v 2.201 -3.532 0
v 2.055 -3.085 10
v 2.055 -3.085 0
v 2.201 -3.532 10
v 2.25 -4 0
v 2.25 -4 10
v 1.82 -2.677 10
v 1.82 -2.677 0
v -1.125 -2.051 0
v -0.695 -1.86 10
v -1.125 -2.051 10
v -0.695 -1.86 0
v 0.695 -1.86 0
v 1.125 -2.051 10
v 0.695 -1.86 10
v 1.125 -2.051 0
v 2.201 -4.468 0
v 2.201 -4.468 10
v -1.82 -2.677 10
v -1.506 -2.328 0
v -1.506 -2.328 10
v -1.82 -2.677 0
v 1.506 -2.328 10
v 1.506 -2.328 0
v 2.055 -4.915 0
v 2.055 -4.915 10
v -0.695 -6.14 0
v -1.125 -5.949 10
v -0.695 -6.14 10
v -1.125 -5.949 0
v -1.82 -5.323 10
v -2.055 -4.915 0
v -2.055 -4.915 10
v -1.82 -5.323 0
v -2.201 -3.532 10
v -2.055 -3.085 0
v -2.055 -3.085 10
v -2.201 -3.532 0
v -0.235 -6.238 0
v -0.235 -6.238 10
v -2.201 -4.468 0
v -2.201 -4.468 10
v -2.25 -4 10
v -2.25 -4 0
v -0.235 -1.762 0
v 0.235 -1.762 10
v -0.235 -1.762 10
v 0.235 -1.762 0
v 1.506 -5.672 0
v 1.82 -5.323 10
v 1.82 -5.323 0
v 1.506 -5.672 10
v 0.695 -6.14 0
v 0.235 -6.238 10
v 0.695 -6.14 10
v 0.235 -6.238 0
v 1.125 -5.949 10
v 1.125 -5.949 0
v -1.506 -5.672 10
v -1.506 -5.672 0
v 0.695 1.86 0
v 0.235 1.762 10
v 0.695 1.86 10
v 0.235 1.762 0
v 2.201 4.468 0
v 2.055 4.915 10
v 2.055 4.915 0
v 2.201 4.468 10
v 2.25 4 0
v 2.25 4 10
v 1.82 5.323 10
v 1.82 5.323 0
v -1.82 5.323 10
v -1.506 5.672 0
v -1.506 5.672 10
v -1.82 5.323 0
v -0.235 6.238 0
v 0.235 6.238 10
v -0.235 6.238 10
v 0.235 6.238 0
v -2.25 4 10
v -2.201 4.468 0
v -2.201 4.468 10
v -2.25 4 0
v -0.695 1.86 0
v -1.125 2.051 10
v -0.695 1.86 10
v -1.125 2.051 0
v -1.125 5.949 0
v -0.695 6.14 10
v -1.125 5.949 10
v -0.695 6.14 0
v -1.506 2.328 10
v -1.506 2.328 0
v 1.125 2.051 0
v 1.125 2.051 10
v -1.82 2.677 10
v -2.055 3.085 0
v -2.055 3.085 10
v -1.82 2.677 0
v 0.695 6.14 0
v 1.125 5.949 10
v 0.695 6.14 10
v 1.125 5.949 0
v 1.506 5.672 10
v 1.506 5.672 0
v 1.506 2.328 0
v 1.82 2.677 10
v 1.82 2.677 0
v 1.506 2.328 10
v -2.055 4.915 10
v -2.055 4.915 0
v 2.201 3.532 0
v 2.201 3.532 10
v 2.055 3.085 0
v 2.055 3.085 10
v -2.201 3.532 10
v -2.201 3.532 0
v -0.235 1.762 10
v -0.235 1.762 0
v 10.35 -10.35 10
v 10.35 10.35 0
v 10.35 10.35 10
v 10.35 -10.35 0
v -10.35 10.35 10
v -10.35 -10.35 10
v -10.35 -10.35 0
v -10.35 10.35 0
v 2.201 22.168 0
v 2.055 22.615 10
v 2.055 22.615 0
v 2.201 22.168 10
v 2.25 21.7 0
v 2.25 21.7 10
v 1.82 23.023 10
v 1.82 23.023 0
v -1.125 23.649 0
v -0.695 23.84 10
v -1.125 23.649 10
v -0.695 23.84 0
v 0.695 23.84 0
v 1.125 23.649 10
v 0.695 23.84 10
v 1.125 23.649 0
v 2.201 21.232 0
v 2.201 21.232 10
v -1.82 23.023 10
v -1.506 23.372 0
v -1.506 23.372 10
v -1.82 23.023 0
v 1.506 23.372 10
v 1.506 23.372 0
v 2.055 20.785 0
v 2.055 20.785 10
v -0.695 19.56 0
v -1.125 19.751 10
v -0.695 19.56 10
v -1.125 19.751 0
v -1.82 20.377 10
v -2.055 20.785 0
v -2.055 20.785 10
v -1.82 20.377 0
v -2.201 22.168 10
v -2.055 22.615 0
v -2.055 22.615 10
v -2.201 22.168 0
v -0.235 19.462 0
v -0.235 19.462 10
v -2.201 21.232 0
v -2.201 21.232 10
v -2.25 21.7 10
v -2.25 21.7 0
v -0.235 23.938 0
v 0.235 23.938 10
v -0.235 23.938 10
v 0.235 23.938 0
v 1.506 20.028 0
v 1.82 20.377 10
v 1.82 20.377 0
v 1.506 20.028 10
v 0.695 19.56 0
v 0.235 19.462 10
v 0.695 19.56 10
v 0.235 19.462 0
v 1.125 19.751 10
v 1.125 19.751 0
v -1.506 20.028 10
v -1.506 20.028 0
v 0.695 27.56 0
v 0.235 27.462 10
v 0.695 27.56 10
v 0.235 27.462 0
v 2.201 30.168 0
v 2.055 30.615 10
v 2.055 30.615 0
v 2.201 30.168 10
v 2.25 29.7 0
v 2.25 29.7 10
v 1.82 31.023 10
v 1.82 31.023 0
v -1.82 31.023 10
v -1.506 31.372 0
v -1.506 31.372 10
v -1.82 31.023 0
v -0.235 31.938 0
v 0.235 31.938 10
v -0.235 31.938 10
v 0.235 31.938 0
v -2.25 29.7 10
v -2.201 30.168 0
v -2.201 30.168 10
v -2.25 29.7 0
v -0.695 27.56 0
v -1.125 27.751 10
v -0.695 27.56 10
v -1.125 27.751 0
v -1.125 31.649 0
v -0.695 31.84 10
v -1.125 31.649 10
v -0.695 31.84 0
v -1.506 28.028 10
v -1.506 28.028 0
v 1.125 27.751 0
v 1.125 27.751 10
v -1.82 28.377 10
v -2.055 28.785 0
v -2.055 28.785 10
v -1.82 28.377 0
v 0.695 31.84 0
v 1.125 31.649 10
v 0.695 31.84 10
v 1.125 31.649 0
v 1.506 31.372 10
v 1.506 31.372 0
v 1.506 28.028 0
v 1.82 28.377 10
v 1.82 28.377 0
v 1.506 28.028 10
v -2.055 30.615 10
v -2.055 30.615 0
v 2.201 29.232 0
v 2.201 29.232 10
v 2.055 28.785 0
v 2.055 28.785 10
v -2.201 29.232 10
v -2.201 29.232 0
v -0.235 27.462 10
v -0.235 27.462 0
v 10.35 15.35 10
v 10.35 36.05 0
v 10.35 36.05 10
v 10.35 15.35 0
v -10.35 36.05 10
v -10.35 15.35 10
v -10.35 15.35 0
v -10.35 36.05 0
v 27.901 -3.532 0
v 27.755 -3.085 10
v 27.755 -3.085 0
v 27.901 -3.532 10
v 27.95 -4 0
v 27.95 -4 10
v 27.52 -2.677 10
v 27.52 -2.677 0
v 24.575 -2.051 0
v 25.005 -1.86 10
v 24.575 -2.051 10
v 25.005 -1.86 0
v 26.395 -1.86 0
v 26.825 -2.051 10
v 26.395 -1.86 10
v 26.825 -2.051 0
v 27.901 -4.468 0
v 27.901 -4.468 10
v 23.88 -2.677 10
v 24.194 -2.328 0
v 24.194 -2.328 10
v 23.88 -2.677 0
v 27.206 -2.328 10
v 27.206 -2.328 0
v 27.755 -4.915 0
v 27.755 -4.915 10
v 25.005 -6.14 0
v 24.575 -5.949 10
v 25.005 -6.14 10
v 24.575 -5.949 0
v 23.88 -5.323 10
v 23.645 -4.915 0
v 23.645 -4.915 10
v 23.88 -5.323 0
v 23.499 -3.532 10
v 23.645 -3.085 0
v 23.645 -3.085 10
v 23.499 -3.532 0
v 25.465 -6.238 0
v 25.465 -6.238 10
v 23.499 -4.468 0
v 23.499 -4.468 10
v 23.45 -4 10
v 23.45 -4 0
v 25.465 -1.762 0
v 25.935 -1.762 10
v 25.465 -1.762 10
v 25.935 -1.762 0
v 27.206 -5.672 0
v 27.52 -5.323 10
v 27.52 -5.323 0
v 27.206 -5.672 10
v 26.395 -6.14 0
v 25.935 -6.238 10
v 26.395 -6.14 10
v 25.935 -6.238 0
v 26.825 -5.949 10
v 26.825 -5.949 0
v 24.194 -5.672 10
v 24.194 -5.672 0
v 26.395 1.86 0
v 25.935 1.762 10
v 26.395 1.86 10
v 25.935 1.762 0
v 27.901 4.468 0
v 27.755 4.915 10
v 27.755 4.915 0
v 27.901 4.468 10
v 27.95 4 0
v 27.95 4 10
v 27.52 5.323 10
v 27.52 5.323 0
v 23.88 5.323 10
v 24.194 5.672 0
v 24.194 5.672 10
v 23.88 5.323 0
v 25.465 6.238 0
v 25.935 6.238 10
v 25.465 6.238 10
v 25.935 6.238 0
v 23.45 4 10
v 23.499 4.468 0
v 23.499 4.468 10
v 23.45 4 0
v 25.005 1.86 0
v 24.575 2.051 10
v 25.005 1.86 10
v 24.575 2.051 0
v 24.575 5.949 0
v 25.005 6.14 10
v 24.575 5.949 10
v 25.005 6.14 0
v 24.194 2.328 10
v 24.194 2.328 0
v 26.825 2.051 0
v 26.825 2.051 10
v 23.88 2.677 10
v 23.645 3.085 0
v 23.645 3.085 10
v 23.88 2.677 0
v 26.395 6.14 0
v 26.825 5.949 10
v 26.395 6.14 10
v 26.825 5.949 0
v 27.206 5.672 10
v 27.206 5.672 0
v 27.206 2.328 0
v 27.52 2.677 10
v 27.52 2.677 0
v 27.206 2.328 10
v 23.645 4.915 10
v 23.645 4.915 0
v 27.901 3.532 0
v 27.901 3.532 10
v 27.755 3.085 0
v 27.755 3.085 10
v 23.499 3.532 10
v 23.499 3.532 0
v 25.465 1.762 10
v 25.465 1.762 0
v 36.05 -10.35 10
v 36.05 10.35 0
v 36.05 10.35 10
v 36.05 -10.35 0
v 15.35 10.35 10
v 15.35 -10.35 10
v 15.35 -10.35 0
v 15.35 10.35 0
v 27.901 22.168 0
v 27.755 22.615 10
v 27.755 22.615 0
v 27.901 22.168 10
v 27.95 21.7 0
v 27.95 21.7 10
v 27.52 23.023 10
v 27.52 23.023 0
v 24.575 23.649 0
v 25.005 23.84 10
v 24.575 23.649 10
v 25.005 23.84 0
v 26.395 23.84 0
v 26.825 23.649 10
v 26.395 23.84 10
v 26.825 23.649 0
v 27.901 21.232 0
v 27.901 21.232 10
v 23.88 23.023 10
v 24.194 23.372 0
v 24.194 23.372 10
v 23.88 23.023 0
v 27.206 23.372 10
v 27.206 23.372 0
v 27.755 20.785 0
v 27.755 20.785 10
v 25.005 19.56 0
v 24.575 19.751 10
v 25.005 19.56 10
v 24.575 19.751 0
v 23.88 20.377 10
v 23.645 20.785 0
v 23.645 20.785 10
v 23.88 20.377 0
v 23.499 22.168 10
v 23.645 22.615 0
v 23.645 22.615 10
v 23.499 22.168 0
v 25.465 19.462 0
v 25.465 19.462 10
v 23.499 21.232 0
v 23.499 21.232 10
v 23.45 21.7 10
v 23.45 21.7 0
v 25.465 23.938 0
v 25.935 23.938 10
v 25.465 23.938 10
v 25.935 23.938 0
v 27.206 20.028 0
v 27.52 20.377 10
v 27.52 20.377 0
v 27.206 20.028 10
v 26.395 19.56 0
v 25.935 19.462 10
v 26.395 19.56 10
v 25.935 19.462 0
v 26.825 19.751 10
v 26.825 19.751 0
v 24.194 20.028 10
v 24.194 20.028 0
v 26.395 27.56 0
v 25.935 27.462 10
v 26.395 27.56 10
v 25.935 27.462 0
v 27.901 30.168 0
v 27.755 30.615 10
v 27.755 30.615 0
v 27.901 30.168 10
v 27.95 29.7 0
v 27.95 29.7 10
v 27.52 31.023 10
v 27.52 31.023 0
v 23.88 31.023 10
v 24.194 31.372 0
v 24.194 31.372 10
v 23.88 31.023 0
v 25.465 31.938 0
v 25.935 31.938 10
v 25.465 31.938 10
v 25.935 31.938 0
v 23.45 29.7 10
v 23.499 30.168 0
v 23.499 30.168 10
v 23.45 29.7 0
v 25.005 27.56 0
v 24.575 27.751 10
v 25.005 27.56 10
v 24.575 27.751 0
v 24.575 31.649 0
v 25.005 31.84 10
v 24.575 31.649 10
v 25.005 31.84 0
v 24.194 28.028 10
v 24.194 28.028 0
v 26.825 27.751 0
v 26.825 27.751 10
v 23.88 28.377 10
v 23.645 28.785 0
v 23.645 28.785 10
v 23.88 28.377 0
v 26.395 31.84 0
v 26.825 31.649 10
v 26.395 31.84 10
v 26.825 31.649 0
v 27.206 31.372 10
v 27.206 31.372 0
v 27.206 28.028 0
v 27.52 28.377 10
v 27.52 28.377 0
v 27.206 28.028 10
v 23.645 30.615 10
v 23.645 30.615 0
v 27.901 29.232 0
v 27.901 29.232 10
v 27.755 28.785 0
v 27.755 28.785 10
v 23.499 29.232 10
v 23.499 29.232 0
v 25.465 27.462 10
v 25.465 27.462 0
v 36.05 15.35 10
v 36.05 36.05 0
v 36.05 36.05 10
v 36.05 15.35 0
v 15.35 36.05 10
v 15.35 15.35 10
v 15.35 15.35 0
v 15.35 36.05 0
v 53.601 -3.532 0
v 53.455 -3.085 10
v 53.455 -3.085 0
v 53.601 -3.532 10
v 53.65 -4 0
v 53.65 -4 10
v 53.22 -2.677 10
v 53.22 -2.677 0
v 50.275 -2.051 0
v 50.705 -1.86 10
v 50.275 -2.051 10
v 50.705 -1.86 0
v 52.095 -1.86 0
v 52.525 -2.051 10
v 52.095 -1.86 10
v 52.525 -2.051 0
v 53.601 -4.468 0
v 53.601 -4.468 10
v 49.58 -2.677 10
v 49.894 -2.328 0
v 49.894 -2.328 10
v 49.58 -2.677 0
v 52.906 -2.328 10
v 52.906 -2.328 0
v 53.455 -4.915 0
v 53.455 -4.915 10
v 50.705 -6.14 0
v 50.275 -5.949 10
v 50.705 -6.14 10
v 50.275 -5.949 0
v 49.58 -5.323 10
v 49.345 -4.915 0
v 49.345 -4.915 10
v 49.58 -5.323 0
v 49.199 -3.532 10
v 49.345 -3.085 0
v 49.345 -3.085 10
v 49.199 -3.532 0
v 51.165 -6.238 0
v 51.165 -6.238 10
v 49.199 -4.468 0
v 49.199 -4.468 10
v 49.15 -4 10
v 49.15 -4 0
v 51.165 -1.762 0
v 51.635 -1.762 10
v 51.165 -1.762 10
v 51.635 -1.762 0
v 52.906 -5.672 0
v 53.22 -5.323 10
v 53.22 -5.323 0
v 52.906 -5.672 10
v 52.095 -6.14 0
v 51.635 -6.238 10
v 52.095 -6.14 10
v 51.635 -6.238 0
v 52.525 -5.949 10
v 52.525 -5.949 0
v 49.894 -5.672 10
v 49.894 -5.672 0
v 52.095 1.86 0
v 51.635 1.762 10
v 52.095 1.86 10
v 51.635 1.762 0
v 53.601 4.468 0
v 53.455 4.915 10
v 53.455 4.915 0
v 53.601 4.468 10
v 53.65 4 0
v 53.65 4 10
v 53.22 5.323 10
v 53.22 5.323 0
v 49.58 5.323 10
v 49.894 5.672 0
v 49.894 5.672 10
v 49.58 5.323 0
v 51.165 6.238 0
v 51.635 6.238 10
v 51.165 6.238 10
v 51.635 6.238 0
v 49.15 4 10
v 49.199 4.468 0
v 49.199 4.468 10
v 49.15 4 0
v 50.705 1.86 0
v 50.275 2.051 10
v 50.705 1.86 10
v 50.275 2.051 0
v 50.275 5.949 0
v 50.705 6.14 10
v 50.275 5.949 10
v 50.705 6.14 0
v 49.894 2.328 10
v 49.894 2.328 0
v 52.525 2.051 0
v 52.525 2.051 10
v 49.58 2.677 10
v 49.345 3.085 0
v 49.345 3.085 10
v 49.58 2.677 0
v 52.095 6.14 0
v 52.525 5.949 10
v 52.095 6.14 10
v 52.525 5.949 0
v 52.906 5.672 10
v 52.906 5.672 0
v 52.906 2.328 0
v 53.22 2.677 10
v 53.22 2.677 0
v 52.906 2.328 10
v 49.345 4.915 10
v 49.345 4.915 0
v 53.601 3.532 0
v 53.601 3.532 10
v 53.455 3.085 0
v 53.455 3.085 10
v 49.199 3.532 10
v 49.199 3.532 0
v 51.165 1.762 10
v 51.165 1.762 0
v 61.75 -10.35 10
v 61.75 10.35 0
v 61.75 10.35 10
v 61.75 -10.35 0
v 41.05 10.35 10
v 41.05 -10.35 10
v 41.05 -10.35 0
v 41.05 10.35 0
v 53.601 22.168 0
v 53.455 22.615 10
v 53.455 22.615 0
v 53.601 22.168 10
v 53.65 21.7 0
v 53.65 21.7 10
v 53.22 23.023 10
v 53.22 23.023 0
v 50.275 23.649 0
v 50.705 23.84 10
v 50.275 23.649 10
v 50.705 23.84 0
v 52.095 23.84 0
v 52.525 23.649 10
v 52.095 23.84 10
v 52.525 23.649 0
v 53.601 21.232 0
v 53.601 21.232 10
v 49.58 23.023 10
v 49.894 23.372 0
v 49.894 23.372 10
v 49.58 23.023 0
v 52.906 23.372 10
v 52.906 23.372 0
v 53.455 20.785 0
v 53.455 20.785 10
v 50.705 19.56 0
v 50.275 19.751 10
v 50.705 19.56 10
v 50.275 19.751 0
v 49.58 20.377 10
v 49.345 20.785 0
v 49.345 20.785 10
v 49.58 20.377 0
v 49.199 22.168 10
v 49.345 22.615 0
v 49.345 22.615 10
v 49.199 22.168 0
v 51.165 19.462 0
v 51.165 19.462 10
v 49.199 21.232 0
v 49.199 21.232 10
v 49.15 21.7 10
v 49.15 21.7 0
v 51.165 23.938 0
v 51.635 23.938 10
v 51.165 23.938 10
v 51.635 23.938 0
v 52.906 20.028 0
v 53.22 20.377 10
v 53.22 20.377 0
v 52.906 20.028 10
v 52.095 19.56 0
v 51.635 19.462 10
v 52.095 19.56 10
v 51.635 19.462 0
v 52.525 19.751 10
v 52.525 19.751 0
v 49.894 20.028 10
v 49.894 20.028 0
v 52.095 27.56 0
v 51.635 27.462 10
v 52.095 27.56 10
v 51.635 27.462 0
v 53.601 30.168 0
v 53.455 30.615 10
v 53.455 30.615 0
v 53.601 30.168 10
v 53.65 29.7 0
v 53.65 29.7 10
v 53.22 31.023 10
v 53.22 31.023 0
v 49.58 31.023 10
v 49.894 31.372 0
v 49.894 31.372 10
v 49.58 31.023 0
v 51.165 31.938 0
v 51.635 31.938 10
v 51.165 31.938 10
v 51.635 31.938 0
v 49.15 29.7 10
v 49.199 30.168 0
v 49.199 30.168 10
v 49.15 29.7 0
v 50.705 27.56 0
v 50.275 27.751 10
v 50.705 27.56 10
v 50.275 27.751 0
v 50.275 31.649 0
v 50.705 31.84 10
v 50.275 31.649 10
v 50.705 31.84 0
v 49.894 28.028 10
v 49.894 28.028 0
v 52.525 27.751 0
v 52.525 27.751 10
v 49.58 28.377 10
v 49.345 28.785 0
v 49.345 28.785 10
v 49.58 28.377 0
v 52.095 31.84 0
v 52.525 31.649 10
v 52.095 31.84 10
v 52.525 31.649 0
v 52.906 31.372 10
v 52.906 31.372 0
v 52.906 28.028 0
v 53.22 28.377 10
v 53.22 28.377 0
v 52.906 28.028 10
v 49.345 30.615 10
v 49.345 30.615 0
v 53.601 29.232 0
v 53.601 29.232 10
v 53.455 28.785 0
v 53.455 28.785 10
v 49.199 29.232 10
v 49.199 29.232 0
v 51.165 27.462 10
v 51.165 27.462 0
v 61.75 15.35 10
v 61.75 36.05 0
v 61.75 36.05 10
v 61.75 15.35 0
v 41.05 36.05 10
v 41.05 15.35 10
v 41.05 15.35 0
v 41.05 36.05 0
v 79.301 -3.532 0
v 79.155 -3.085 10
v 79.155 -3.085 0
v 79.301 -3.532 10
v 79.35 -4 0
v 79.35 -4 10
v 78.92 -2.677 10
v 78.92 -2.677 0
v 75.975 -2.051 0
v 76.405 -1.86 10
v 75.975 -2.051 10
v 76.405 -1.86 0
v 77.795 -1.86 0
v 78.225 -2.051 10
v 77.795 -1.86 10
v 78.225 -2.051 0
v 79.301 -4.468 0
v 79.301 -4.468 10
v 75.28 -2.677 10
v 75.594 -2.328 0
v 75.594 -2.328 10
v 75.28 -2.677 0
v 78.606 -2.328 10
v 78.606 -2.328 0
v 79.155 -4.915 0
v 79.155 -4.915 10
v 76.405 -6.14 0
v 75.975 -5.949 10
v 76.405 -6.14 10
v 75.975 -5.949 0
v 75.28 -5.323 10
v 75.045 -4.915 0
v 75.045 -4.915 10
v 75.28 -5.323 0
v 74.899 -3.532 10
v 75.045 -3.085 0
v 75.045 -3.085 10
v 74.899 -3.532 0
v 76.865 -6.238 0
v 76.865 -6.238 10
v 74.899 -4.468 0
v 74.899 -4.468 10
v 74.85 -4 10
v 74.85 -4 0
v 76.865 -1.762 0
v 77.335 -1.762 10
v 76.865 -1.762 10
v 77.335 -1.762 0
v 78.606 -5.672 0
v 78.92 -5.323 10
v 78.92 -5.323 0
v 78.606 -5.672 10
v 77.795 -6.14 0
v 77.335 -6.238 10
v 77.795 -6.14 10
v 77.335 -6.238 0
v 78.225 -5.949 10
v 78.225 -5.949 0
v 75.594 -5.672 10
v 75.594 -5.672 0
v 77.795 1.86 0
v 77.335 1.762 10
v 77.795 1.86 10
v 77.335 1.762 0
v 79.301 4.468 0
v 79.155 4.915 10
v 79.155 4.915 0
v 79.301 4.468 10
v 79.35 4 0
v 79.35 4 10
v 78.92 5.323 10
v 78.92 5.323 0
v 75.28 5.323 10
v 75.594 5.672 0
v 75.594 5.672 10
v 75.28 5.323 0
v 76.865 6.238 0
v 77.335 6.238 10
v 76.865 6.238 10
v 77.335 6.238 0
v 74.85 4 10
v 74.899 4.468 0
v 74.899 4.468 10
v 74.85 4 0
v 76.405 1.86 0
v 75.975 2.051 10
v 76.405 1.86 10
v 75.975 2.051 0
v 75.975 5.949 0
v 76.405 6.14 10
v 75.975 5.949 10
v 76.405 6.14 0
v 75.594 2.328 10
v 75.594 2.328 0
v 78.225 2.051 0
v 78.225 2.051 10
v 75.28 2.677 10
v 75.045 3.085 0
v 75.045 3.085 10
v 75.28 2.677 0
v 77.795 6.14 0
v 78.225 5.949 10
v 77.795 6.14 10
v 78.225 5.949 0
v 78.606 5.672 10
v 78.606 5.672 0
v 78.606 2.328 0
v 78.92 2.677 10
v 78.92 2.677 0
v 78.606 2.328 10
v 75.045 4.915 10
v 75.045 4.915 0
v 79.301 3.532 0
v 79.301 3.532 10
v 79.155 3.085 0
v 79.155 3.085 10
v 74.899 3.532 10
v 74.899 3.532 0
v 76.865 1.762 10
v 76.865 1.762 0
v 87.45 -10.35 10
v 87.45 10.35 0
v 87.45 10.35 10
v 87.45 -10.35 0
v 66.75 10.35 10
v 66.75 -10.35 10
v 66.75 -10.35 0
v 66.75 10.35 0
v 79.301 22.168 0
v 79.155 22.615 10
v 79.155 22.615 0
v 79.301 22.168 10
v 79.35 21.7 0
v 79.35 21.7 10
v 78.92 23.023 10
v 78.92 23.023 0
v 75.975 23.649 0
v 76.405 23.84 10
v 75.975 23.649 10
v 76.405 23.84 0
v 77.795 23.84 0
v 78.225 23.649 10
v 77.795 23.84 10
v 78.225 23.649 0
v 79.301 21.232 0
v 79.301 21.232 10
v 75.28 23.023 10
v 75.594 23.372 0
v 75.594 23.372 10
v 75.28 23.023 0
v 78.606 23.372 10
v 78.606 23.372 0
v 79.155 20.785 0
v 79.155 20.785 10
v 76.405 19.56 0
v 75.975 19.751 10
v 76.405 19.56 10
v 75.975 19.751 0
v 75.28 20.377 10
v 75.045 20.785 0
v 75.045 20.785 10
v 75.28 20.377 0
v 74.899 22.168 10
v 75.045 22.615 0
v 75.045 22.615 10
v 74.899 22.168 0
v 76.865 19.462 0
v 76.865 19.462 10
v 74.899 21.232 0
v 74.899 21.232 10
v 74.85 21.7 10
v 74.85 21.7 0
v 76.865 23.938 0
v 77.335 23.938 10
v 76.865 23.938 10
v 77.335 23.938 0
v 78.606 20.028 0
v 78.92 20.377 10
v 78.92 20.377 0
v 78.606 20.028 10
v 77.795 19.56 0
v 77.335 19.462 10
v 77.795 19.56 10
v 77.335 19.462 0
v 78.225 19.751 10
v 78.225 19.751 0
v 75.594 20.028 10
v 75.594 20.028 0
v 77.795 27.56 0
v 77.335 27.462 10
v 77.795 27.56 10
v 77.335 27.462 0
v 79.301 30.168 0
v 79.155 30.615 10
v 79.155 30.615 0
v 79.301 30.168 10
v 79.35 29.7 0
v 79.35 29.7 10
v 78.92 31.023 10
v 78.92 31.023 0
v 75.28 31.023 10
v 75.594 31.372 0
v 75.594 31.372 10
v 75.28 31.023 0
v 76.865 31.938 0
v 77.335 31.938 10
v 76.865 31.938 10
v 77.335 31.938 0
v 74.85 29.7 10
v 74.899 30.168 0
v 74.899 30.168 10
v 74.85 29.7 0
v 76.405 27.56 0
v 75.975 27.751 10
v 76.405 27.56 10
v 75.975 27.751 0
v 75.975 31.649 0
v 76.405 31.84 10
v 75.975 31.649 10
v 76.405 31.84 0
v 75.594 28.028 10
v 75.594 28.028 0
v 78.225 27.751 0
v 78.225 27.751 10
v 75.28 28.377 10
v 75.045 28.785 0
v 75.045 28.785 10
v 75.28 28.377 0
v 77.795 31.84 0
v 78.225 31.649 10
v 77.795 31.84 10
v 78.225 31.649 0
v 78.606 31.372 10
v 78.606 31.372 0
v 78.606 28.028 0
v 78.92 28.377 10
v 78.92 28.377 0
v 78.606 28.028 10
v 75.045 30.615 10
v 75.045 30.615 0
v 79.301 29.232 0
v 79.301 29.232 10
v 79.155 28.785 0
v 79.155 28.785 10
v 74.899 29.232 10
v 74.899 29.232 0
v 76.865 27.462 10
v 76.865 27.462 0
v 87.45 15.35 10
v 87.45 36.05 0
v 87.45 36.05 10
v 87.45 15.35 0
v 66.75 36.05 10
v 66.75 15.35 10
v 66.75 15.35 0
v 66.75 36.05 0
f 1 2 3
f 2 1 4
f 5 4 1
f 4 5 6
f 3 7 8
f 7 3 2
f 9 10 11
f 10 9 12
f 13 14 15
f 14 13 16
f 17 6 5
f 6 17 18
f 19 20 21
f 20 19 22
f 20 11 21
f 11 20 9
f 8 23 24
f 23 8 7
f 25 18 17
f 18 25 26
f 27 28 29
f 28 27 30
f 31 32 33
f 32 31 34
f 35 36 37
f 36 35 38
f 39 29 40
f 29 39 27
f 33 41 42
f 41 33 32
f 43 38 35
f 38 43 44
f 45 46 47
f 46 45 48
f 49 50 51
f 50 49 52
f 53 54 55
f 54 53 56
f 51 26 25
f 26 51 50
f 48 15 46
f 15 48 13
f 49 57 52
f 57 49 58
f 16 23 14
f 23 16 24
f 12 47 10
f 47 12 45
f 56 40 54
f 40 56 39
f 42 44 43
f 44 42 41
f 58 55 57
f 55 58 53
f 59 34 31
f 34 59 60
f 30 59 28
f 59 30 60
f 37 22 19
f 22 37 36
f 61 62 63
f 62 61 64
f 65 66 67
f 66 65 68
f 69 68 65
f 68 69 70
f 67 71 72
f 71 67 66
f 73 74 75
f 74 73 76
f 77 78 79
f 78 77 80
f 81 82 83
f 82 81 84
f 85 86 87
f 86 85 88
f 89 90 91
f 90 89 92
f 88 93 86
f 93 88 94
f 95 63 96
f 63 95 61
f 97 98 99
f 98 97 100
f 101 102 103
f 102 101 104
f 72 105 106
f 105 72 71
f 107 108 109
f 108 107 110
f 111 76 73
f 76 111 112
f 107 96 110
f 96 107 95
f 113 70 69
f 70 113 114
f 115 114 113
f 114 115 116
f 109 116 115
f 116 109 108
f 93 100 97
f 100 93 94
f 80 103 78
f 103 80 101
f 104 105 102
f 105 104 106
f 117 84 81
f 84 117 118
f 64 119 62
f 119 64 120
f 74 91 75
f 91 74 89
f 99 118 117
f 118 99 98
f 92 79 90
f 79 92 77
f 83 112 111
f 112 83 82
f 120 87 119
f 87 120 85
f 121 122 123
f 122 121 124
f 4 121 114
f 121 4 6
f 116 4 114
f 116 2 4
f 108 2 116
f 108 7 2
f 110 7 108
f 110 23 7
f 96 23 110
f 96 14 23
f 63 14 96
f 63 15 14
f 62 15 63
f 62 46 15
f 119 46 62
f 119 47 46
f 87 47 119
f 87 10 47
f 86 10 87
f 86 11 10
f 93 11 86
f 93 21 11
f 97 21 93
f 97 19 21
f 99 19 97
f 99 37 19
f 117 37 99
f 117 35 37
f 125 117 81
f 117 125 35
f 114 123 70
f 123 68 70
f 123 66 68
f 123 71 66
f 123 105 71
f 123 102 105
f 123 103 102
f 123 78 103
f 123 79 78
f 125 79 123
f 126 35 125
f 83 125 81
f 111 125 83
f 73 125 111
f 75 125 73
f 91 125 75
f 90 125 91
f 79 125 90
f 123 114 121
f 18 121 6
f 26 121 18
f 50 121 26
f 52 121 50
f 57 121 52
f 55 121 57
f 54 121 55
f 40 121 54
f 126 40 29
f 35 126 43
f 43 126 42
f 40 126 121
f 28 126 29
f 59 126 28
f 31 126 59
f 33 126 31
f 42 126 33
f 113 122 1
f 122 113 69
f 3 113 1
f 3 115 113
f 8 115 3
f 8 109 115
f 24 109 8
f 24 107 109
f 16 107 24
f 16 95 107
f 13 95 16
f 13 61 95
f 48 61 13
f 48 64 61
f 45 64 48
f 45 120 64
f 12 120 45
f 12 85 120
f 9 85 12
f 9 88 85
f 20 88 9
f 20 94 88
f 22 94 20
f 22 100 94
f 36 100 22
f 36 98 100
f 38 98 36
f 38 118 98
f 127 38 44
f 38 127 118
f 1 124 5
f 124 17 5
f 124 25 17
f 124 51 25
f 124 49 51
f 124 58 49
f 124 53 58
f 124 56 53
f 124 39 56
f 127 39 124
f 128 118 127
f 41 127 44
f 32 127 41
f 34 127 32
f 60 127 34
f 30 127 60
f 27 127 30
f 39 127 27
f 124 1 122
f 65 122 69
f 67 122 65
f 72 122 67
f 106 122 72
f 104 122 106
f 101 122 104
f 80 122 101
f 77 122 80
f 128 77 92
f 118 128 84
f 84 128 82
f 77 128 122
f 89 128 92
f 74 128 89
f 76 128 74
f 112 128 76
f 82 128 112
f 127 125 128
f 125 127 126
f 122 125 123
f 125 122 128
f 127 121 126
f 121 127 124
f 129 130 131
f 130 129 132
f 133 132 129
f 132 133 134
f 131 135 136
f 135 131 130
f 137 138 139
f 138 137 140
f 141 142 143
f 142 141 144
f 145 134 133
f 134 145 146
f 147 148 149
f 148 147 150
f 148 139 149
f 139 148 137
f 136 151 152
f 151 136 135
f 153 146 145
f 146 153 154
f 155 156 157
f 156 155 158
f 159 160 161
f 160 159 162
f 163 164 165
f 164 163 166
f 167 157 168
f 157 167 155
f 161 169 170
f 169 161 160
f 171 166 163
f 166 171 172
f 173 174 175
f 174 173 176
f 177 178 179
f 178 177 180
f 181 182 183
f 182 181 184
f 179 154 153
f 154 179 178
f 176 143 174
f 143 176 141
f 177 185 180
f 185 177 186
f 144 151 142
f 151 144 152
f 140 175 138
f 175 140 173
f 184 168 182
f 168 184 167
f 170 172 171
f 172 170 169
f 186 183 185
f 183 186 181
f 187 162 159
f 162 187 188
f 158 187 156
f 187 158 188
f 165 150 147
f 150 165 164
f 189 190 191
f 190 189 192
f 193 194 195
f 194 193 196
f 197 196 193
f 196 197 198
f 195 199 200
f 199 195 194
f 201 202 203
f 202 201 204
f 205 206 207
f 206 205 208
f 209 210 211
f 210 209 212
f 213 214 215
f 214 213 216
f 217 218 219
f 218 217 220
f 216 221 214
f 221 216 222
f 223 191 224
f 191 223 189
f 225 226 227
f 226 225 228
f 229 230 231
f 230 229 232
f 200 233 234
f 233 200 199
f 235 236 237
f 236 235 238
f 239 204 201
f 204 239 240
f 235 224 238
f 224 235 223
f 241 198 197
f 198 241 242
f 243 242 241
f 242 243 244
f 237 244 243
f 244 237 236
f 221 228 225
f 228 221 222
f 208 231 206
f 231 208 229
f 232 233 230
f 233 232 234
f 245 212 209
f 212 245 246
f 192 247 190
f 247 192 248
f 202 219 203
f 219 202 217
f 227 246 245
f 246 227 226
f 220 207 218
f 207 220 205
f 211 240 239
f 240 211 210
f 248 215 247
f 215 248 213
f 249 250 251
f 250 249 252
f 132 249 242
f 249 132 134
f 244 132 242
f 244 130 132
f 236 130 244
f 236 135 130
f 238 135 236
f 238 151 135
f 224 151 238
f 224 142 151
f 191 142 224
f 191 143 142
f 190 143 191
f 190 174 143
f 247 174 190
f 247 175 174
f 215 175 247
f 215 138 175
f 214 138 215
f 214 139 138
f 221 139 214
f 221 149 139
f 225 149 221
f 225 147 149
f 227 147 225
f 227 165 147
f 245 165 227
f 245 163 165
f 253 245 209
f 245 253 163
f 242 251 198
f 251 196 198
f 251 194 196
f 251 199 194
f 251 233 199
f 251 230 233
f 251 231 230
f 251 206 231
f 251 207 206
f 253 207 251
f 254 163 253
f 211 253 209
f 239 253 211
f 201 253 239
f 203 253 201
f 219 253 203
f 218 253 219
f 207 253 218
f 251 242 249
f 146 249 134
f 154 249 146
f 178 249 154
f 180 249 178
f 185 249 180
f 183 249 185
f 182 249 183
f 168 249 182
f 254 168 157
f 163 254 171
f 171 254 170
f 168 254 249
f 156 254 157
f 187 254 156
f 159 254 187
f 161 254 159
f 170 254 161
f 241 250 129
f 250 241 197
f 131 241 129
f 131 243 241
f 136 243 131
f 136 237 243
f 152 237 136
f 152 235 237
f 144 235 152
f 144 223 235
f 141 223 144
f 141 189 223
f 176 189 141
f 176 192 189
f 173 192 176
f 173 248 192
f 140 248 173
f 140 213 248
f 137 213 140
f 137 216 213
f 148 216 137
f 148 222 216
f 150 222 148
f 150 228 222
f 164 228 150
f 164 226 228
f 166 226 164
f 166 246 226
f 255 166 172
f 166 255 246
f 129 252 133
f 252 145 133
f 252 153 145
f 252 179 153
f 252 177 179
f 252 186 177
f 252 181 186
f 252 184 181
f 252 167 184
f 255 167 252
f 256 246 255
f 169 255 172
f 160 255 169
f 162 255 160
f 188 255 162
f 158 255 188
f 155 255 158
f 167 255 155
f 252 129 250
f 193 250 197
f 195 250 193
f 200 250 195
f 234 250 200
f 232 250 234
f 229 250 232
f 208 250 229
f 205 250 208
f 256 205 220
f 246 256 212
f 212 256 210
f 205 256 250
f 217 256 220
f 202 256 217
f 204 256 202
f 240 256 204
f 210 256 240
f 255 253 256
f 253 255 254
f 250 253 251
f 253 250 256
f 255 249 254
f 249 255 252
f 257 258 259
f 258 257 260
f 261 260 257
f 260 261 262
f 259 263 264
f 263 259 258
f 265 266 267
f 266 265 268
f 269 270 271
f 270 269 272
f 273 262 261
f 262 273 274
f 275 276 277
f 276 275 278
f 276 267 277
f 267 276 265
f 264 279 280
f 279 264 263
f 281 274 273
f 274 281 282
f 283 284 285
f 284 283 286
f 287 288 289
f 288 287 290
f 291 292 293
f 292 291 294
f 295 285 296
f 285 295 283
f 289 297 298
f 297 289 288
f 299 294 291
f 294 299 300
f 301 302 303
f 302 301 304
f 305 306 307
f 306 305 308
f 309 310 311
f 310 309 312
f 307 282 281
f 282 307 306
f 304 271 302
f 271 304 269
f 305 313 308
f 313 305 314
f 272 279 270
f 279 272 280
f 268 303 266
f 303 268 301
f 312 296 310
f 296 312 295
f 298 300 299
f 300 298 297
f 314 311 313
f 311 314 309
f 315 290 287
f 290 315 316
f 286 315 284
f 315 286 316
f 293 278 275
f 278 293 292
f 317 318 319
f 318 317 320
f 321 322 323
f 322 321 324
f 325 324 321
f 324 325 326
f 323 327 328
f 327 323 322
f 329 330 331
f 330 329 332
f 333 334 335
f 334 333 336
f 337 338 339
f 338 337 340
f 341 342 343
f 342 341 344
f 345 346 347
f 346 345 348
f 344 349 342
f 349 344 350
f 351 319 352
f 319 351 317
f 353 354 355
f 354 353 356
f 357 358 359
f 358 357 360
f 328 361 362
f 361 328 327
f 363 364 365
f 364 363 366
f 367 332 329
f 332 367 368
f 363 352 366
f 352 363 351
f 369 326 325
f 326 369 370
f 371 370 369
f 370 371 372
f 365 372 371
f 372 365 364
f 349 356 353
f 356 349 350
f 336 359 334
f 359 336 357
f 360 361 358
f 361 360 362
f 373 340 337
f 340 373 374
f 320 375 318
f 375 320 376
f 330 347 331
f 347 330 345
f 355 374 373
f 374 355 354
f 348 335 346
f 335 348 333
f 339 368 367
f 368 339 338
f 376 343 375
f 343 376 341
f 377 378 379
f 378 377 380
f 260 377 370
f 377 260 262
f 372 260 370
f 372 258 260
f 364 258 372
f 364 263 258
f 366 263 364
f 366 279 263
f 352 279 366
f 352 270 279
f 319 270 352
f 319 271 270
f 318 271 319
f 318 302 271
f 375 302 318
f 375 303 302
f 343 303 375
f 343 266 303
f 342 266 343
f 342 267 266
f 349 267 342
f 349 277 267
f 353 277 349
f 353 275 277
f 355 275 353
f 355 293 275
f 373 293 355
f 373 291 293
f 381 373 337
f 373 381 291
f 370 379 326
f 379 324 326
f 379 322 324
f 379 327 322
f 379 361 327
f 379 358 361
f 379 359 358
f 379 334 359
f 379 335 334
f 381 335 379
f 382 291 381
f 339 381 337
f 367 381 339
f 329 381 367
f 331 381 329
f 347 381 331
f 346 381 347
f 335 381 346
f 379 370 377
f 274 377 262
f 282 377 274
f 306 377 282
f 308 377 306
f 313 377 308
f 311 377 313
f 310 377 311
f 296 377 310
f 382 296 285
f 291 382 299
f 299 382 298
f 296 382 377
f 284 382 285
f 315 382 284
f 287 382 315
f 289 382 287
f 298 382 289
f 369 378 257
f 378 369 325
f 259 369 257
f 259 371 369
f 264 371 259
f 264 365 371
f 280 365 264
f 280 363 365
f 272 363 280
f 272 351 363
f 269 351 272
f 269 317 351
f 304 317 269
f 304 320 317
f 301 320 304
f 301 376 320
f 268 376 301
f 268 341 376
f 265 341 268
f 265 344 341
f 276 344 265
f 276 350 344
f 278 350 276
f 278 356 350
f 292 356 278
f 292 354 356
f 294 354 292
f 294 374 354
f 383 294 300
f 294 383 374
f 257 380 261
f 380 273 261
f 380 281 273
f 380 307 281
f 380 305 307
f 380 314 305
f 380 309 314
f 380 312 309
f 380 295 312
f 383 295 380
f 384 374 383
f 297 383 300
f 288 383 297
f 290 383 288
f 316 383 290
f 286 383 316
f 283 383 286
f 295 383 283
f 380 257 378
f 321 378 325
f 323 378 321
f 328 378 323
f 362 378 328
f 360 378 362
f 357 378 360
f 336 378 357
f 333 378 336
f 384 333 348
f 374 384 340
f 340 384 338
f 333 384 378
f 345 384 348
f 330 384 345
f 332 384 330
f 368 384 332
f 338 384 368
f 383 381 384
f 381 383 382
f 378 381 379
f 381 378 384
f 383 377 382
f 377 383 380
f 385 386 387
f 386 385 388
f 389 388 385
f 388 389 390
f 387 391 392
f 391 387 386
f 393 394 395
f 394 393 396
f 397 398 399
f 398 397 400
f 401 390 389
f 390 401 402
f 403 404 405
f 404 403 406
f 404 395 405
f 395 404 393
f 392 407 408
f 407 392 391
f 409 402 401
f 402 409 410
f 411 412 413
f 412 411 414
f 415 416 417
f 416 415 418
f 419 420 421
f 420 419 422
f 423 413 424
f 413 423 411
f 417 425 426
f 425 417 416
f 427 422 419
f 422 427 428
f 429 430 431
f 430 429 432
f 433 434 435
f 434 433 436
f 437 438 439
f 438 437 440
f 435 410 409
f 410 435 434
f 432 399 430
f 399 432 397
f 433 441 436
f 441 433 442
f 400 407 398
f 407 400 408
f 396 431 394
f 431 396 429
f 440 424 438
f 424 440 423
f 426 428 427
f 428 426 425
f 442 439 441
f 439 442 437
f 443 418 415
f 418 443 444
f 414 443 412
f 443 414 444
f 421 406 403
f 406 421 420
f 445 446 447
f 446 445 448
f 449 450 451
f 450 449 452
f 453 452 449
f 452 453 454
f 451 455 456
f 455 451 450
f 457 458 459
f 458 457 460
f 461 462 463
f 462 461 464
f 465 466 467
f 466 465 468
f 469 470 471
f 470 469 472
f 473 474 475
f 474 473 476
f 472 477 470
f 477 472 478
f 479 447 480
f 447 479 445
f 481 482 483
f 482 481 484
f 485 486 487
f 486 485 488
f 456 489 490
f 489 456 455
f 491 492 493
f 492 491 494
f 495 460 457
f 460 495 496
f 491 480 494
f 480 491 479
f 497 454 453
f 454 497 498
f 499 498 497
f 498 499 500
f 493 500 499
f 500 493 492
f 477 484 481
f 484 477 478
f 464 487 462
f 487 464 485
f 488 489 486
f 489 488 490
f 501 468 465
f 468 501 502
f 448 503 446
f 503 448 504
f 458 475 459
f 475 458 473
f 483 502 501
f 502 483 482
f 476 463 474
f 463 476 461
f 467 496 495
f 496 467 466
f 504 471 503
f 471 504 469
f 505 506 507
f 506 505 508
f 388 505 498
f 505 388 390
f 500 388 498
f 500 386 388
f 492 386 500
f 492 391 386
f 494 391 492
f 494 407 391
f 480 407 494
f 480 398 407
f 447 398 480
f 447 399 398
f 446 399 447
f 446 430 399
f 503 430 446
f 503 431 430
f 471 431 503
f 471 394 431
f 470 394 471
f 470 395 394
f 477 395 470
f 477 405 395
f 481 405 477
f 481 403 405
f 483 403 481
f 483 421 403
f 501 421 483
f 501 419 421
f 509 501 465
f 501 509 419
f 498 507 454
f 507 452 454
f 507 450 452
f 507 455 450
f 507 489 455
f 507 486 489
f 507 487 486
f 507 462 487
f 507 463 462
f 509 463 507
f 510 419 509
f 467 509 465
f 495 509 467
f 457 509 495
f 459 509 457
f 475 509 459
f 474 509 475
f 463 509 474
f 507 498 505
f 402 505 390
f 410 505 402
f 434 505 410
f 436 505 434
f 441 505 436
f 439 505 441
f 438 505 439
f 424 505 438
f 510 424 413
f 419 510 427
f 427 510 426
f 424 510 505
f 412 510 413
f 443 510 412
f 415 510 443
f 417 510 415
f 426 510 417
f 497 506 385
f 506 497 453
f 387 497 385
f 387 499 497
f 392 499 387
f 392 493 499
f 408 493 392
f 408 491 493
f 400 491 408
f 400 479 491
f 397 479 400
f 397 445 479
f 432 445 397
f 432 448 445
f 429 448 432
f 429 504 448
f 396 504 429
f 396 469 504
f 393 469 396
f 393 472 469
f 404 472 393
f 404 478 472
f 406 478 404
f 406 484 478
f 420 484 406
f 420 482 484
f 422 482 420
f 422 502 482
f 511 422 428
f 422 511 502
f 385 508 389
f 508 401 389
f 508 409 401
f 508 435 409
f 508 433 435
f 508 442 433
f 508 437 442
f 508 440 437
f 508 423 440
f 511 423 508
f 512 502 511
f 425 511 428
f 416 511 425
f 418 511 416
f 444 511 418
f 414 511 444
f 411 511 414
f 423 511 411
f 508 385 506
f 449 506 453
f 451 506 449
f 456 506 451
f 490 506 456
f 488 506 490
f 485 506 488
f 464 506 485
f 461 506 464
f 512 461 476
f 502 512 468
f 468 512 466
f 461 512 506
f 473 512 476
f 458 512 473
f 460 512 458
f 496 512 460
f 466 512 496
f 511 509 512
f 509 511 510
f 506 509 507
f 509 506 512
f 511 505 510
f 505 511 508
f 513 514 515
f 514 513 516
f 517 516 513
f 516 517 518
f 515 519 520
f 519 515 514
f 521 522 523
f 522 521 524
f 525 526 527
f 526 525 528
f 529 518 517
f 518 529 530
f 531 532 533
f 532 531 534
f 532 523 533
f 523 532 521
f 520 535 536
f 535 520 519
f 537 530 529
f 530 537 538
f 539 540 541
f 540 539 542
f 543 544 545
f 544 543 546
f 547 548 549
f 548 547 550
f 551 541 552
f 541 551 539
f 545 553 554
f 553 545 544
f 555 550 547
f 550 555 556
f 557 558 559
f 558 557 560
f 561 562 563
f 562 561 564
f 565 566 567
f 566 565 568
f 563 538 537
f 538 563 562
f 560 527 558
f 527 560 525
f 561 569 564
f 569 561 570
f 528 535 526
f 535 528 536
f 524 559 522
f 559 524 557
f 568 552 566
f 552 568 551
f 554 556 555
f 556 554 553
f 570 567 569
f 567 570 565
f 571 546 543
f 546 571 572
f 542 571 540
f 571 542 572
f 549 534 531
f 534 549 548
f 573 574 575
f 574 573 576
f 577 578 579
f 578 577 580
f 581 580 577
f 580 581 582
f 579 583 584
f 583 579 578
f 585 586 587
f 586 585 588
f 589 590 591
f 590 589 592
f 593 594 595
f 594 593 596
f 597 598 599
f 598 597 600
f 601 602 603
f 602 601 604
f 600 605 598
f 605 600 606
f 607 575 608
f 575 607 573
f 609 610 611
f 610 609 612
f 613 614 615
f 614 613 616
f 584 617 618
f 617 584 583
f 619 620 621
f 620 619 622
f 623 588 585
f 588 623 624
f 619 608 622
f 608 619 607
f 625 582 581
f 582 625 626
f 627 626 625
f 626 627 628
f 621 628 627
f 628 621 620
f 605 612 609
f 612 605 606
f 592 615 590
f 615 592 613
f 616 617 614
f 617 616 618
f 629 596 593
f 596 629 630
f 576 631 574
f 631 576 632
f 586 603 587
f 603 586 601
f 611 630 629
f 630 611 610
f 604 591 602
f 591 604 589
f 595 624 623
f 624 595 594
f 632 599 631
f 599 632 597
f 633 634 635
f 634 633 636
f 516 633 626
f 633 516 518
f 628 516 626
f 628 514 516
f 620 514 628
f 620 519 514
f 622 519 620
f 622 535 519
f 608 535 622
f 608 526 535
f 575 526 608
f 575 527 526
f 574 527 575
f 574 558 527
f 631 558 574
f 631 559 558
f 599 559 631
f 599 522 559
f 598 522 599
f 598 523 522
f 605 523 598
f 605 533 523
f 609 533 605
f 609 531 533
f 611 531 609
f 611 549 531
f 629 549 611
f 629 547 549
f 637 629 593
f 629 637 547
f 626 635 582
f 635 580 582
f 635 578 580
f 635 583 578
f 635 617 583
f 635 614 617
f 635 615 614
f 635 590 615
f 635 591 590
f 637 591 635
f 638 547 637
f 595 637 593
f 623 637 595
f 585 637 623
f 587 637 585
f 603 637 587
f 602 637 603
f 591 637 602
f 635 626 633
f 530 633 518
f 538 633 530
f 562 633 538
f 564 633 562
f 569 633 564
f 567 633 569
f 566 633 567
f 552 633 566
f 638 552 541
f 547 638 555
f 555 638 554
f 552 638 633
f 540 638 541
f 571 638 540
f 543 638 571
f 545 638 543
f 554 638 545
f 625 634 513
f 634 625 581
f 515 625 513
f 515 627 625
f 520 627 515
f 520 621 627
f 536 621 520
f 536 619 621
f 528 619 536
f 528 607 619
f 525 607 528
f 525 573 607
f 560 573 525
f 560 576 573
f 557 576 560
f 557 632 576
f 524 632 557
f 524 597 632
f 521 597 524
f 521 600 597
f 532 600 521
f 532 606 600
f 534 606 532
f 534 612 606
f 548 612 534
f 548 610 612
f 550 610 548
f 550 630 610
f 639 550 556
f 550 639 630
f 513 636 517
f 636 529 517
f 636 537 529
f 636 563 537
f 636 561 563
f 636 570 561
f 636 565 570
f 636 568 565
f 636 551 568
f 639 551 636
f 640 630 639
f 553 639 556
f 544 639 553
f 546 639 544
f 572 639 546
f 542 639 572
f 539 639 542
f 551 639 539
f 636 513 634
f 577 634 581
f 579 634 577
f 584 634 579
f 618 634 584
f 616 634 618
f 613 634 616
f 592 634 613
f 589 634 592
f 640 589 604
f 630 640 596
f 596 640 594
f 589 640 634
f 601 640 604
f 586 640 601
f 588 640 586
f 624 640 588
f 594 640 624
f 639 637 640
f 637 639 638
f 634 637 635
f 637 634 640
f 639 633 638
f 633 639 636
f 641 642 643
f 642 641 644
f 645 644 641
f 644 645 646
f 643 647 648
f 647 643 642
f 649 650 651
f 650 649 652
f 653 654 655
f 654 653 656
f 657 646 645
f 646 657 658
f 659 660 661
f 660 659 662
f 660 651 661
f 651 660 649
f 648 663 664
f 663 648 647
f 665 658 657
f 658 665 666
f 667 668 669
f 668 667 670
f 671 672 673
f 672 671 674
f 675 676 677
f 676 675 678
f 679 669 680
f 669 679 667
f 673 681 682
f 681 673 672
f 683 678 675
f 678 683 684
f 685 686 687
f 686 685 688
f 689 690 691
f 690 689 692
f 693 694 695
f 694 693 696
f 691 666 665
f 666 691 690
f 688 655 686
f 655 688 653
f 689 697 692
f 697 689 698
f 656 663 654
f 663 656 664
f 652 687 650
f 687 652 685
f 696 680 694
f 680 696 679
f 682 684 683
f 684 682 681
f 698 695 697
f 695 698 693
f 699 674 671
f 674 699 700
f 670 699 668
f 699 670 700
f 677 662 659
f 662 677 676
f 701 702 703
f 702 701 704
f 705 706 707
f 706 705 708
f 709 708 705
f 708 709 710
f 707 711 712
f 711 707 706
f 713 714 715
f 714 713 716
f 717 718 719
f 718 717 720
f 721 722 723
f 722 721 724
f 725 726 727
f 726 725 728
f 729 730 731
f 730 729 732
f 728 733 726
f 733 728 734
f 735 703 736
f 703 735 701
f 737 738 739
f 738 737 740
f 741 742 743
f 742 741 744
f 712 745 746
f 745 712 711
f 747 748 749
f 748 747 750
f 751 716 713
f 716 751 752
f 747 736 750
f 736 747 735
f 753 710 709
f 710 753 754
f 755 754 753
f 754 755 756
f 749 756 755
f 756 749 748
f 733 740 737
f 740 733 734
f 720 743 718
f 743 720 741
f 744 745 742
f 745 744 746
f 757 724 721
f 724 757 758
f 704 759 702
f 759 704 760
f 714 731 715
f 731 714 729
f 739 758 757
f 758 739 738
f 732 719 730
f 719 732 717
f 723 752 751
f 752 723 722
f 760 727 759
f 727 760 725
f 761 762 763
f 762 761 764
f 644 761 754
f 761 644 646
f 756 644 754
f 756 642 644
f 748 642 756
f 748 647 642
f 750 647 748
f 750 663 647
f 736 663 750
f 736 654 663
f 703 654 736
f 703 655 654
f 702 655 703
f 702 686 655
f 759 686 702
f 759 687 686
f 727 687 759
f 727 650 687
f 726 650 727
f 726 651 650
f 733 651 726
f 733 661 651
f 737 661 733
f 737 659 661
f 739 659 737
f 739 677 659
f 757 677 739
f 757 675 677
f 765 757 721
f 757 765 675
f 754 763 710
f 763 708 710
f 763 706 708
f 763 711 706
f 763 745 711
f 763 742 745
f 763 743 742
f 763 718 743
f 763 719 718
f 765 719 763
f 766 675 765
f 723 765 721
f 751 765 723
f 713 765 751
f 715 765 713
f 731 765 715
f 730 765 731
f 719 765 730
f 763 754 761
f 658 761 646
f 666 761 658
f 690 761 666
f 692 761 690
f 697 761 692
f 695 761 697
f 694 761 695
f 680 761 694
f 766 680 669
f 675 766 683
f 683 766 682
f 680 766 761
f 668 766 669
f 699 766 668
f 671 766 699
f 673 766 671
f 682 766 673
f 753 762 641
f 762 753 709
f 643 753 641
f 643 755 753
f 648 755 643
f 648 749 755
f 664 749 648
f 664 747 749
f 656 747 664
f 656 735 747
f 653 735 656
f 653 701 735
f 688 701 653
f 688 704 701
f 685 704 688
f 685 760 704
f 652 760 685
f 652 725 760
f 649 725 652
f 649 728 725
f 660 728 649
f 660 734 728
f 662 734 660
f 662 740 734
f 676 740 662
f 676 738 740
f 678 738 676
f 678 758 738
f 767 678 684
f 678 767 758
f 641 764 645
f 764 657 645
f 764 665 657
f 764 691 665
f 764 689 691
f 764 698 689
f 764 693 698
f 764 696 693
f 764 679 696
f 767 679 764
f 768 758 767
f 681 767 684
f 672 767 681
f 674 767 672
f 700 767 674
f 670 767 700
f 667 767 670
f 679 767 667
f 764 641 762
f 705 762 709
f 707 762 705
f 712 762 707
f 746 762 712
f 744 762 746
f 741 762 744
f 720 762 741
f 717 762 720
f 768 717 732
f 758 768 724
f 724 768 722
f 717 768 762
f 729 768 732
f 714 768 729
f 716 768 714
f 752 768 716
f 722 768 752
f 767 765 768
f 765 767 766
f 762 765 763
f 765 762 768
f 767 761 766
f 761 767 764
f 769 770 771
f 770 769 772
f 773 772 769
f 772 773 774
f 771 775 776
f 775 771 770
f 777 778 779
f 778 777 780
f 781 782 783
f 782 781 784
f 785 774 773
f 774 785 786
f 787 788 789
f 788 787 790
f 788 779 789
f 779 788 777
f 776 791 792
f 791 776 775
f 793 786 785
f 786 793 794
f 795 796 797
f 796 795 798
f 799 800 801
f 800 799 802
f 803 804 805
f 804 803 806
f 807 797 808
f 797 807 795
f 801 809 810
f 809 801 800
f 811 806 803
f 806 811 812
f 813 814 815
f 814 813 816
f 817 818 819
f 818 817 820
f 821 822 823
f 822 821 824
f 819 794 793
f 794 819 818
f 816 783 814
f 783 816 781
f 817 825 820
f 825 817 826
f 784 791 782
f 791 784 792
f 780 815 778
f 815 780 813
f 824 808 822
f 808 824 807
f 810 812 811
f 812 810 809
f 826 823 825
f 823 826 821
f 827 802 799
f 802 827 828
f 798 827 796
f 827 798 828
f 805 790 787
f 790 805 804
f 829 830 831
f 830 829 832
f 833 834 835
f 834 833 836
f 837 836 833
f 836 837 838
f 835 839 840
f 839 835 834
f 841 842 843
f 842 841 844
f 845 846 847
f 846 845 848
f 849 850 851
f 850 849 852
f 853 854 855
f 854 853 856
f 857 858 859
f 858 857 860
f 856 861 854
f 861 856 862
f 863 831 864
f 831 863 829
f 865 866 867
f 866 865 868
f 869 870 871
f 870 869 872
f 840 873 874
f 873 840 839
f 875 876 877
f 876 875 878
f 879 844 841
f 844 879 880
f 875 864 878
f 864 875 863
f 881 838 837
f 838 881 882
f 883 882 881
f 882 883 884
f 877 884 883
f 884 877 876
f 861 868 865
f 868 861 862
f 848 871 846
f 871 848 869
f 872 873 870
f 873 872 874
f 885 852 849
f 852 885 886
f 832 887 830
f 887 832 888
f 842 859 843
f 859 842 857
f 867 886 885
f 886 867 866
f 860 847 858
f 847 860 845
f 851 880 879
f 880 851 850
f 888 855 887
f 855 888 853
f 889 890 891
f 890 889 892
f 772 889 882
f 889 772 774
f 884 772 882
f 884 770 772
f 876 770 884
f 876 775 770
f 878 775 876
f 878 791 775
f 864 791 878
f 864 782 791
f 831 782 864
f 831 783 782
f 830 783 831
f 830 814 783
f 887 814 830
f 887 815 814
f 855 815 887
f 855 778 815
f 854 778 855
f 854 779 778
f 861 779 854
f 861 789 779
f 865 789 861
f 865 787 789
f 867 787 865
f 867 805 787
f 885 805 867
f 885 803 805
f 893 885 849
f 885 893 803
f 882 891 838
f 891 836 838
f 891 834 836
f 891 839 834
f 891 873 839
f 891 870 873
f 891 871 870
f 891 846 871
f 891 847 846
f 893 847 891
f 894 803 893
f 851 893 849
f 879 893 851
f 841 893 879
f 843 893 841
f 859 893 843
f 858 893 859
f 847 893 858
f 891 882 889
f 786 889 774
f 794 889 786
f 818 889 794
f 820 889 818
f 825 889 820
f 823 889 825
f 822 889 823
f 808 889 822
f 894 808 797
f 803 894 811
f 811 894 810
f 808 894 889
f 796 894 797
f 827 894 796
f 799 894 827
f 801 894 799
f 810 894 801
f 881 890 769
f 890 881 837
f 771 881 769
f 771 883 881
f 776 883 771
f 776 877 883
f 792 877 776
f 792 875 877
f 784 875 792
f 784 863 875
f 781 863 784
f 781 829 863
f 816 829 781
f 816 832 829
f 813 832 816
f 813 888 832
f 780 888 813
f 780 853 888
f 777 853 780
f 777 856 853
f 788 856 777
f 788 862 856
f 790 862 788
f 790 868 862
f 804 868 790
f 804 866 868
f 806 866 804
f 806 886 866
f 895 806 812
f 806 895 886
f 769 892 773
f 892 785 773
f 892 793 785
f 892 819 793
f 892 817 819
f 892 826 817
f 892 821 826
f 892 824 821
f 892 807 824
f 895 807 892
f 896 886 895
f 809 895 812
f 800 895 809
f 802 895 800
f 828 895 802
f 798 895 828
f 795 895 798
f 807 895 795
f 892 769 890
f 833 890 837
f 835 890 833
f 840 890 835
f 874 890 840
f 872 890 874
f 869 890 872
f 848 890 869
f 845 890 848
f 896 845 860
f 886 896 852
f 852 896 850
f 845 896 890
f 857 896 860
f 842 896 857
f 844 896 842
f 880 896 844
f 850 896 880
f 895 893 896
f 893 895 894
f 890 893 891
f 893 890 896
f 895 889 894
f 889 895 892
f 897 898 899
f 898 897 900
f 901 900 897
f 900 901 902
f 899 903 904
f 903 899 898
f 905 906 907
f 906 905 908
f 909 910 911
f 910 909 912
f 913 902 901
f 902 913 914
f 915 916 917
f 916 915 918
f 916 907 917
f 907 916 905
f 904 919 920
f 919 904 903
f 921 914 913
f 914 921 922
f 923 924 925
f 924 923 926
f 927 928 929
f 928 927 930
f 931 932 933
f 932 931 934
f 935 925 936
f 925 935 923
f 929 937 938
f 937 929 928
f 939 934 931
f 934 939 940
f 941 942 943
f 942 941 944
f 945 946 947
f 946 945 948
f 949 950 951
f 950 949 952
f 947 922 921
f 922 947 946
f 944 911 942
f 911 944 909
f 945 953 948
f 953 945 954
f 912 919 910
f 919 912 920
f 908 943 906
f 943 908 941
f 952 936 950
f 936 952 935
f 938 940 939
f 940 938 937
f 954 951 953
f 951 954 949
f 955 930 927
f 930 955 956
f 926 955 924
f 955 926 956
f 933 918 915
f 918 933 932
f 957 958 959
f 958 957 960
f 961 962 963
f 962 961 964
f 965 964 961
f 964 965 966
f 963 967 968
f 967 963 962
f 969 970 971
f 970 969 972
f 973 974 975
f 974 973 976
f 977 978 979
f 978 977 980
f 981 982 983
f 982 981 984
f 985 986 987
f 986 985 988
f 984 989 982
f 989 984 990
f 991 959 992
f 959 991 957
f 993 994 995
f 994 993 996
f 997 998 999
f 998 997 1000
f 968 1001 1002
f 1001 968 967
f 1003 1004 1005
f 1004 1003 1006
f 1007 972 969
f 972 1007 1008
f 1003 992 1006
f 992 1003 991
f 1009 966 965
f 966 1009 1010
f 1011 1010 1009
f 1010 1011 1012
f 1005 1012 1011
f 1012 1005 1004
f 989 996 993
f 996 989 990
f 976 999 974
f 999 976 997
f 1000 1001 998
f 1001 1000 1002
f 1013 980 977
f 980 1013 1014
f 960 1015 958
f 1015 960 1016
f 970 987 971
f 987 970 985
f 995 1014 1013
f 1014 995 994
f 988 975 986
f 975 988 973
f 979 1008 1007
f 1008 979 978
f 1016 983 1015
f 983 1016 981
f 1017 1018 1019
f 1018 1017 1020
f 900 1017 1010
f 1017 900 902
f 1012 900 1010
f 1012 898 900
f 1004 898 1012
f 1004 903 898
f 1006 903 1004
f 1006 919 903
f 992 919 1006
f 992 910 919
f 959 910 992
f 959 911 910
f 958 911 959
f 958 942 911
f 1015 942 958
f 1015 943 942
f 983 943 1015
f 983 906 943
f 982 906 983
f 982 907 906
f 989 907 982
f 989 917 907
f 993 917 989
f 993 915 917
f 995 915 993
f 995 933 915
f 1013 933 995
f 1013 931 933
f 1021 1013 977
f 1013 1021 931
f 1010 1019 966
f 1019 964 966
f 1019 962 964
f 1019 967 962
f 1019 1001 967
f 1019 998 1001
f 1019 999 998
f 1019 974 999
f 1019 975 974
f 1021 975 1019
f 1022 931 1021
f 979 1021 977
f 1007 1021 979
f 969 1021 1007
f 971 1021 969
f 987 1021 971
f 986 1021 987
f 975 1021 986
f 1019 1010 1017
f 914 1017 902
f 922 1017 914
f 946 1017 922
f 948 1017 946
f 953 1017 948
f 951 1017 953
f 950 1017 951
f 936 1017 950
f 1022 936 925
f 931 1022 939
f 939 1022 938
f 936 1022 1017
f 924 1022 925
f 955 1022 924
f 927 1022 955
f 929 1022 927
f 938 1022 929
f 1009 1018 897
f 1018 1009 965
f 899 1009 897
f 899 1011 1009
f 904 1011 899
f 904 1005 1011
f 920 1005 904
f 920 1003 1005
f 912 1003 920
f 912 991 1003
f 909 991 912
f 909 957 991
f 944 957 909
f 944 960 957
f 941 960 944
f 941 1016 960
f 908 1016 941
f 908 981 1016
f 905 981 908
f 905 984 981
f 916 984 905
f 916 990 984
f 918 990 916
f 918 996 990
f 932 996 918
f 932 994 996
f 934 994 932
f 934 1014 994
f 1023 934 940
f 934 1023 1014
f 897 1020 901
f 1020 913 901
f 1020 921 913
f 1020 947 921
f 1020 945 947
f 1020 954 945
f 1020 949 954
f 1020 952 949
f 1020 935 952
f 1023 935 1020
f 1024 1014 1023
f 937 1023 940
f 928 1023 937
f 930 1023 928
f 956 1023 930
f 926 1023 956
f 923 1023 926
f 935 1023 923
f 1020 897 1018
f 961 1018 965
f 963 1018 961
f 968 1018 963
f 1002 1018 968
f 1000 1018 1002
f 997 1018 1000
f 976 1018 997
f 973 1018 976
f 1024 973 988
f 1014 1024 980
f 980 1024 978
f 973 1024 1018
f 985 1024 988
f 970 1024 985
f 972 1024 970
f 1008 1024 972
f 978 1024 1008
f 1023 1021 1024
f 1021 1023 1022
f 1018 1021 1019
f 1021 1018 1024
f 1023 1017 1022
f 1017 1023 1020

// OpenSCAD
// Stock Clock — the only part you need to print.
//
// It is a block with two holes. You need 8 of them: two per slot.
// Both the fixed-end and the load-end spacer are this same part, so there is
// nothing to keep track of.
//
// HOW TO USE THIS FILE — no CAD experience needed:
//   1. Install OpenSCAD (free, openscad.org).
//   2. Open this file.
//   3. Measure your load cell when it arrives. Change the four numbers below.
//      Nothing else in the file needs touching.
//   4. Press F5 to look at it. Press F6 to build it properly.
//   5. File > Export > Export as STL. Slice and print 8.
//
// PRINT SETTINGS: no supports, 4 perimeters, 40% infill. These carry the whole
// weight of a basin of vegetables, so do not print them at 10% infill.

// ── MEASURE YOUR LOAD CELL, THEN CHANGE THESE FOUR NUMBERS ───────────────
CELL_W     = 12.7;  // width of the metal bar (callipers, or the spec sheet)
HOLE_GAP   = 8;     // centre-to-centre between the TWO holes at ONE end
BOLT_D     = 4;     // the bolt you are using: 4 for M4, 5 for M5
GAP_HEIGHT = 10;    // air under the free end so it can bend. 10 is safe.
// ─────────────────────────────────────────────────────────────────────────

// Everything below is worked out from the four numbers above.

BLOCK = CELL_W + 8;        // a bit wider than the cell so it seats flat
HOLE  = BOLT_D + 0.5;      // printed holes come out undersize; this is the slop

module spacer() {
    difference() {
        translate([-BLOCK / 2, -BLOCK / 2, 0])
            cube([BLOCK, BLOCK, GAP_HEIGHT]);

        // two bolt holes, straight through
        for (y = [-HOLE_GAP / 2, HOLE_GAP / 2])
            translate([0, y, -1])
                cylinder(d = HOLE, h = GAP_HEIGHT + 2, $fn = 30);
    }
}

// Laid out as a printable plate of 8. Delete the loop and leave a bare
// spacer() if your slicer would rather arrange them itself.
for (i = [0:3], j = [0:1])
    translate([i * (BLOCK + 5), j * (BLOCK + 5), 0]) spacer();

// ponytail: a plain block, not a bracket that hugs the cell. A hugging bracket
// has to match one exact load cell; this one works with whatever arrives, and
// the bolts do the locating. Print a single one first and check it before
// committing to all 8.
